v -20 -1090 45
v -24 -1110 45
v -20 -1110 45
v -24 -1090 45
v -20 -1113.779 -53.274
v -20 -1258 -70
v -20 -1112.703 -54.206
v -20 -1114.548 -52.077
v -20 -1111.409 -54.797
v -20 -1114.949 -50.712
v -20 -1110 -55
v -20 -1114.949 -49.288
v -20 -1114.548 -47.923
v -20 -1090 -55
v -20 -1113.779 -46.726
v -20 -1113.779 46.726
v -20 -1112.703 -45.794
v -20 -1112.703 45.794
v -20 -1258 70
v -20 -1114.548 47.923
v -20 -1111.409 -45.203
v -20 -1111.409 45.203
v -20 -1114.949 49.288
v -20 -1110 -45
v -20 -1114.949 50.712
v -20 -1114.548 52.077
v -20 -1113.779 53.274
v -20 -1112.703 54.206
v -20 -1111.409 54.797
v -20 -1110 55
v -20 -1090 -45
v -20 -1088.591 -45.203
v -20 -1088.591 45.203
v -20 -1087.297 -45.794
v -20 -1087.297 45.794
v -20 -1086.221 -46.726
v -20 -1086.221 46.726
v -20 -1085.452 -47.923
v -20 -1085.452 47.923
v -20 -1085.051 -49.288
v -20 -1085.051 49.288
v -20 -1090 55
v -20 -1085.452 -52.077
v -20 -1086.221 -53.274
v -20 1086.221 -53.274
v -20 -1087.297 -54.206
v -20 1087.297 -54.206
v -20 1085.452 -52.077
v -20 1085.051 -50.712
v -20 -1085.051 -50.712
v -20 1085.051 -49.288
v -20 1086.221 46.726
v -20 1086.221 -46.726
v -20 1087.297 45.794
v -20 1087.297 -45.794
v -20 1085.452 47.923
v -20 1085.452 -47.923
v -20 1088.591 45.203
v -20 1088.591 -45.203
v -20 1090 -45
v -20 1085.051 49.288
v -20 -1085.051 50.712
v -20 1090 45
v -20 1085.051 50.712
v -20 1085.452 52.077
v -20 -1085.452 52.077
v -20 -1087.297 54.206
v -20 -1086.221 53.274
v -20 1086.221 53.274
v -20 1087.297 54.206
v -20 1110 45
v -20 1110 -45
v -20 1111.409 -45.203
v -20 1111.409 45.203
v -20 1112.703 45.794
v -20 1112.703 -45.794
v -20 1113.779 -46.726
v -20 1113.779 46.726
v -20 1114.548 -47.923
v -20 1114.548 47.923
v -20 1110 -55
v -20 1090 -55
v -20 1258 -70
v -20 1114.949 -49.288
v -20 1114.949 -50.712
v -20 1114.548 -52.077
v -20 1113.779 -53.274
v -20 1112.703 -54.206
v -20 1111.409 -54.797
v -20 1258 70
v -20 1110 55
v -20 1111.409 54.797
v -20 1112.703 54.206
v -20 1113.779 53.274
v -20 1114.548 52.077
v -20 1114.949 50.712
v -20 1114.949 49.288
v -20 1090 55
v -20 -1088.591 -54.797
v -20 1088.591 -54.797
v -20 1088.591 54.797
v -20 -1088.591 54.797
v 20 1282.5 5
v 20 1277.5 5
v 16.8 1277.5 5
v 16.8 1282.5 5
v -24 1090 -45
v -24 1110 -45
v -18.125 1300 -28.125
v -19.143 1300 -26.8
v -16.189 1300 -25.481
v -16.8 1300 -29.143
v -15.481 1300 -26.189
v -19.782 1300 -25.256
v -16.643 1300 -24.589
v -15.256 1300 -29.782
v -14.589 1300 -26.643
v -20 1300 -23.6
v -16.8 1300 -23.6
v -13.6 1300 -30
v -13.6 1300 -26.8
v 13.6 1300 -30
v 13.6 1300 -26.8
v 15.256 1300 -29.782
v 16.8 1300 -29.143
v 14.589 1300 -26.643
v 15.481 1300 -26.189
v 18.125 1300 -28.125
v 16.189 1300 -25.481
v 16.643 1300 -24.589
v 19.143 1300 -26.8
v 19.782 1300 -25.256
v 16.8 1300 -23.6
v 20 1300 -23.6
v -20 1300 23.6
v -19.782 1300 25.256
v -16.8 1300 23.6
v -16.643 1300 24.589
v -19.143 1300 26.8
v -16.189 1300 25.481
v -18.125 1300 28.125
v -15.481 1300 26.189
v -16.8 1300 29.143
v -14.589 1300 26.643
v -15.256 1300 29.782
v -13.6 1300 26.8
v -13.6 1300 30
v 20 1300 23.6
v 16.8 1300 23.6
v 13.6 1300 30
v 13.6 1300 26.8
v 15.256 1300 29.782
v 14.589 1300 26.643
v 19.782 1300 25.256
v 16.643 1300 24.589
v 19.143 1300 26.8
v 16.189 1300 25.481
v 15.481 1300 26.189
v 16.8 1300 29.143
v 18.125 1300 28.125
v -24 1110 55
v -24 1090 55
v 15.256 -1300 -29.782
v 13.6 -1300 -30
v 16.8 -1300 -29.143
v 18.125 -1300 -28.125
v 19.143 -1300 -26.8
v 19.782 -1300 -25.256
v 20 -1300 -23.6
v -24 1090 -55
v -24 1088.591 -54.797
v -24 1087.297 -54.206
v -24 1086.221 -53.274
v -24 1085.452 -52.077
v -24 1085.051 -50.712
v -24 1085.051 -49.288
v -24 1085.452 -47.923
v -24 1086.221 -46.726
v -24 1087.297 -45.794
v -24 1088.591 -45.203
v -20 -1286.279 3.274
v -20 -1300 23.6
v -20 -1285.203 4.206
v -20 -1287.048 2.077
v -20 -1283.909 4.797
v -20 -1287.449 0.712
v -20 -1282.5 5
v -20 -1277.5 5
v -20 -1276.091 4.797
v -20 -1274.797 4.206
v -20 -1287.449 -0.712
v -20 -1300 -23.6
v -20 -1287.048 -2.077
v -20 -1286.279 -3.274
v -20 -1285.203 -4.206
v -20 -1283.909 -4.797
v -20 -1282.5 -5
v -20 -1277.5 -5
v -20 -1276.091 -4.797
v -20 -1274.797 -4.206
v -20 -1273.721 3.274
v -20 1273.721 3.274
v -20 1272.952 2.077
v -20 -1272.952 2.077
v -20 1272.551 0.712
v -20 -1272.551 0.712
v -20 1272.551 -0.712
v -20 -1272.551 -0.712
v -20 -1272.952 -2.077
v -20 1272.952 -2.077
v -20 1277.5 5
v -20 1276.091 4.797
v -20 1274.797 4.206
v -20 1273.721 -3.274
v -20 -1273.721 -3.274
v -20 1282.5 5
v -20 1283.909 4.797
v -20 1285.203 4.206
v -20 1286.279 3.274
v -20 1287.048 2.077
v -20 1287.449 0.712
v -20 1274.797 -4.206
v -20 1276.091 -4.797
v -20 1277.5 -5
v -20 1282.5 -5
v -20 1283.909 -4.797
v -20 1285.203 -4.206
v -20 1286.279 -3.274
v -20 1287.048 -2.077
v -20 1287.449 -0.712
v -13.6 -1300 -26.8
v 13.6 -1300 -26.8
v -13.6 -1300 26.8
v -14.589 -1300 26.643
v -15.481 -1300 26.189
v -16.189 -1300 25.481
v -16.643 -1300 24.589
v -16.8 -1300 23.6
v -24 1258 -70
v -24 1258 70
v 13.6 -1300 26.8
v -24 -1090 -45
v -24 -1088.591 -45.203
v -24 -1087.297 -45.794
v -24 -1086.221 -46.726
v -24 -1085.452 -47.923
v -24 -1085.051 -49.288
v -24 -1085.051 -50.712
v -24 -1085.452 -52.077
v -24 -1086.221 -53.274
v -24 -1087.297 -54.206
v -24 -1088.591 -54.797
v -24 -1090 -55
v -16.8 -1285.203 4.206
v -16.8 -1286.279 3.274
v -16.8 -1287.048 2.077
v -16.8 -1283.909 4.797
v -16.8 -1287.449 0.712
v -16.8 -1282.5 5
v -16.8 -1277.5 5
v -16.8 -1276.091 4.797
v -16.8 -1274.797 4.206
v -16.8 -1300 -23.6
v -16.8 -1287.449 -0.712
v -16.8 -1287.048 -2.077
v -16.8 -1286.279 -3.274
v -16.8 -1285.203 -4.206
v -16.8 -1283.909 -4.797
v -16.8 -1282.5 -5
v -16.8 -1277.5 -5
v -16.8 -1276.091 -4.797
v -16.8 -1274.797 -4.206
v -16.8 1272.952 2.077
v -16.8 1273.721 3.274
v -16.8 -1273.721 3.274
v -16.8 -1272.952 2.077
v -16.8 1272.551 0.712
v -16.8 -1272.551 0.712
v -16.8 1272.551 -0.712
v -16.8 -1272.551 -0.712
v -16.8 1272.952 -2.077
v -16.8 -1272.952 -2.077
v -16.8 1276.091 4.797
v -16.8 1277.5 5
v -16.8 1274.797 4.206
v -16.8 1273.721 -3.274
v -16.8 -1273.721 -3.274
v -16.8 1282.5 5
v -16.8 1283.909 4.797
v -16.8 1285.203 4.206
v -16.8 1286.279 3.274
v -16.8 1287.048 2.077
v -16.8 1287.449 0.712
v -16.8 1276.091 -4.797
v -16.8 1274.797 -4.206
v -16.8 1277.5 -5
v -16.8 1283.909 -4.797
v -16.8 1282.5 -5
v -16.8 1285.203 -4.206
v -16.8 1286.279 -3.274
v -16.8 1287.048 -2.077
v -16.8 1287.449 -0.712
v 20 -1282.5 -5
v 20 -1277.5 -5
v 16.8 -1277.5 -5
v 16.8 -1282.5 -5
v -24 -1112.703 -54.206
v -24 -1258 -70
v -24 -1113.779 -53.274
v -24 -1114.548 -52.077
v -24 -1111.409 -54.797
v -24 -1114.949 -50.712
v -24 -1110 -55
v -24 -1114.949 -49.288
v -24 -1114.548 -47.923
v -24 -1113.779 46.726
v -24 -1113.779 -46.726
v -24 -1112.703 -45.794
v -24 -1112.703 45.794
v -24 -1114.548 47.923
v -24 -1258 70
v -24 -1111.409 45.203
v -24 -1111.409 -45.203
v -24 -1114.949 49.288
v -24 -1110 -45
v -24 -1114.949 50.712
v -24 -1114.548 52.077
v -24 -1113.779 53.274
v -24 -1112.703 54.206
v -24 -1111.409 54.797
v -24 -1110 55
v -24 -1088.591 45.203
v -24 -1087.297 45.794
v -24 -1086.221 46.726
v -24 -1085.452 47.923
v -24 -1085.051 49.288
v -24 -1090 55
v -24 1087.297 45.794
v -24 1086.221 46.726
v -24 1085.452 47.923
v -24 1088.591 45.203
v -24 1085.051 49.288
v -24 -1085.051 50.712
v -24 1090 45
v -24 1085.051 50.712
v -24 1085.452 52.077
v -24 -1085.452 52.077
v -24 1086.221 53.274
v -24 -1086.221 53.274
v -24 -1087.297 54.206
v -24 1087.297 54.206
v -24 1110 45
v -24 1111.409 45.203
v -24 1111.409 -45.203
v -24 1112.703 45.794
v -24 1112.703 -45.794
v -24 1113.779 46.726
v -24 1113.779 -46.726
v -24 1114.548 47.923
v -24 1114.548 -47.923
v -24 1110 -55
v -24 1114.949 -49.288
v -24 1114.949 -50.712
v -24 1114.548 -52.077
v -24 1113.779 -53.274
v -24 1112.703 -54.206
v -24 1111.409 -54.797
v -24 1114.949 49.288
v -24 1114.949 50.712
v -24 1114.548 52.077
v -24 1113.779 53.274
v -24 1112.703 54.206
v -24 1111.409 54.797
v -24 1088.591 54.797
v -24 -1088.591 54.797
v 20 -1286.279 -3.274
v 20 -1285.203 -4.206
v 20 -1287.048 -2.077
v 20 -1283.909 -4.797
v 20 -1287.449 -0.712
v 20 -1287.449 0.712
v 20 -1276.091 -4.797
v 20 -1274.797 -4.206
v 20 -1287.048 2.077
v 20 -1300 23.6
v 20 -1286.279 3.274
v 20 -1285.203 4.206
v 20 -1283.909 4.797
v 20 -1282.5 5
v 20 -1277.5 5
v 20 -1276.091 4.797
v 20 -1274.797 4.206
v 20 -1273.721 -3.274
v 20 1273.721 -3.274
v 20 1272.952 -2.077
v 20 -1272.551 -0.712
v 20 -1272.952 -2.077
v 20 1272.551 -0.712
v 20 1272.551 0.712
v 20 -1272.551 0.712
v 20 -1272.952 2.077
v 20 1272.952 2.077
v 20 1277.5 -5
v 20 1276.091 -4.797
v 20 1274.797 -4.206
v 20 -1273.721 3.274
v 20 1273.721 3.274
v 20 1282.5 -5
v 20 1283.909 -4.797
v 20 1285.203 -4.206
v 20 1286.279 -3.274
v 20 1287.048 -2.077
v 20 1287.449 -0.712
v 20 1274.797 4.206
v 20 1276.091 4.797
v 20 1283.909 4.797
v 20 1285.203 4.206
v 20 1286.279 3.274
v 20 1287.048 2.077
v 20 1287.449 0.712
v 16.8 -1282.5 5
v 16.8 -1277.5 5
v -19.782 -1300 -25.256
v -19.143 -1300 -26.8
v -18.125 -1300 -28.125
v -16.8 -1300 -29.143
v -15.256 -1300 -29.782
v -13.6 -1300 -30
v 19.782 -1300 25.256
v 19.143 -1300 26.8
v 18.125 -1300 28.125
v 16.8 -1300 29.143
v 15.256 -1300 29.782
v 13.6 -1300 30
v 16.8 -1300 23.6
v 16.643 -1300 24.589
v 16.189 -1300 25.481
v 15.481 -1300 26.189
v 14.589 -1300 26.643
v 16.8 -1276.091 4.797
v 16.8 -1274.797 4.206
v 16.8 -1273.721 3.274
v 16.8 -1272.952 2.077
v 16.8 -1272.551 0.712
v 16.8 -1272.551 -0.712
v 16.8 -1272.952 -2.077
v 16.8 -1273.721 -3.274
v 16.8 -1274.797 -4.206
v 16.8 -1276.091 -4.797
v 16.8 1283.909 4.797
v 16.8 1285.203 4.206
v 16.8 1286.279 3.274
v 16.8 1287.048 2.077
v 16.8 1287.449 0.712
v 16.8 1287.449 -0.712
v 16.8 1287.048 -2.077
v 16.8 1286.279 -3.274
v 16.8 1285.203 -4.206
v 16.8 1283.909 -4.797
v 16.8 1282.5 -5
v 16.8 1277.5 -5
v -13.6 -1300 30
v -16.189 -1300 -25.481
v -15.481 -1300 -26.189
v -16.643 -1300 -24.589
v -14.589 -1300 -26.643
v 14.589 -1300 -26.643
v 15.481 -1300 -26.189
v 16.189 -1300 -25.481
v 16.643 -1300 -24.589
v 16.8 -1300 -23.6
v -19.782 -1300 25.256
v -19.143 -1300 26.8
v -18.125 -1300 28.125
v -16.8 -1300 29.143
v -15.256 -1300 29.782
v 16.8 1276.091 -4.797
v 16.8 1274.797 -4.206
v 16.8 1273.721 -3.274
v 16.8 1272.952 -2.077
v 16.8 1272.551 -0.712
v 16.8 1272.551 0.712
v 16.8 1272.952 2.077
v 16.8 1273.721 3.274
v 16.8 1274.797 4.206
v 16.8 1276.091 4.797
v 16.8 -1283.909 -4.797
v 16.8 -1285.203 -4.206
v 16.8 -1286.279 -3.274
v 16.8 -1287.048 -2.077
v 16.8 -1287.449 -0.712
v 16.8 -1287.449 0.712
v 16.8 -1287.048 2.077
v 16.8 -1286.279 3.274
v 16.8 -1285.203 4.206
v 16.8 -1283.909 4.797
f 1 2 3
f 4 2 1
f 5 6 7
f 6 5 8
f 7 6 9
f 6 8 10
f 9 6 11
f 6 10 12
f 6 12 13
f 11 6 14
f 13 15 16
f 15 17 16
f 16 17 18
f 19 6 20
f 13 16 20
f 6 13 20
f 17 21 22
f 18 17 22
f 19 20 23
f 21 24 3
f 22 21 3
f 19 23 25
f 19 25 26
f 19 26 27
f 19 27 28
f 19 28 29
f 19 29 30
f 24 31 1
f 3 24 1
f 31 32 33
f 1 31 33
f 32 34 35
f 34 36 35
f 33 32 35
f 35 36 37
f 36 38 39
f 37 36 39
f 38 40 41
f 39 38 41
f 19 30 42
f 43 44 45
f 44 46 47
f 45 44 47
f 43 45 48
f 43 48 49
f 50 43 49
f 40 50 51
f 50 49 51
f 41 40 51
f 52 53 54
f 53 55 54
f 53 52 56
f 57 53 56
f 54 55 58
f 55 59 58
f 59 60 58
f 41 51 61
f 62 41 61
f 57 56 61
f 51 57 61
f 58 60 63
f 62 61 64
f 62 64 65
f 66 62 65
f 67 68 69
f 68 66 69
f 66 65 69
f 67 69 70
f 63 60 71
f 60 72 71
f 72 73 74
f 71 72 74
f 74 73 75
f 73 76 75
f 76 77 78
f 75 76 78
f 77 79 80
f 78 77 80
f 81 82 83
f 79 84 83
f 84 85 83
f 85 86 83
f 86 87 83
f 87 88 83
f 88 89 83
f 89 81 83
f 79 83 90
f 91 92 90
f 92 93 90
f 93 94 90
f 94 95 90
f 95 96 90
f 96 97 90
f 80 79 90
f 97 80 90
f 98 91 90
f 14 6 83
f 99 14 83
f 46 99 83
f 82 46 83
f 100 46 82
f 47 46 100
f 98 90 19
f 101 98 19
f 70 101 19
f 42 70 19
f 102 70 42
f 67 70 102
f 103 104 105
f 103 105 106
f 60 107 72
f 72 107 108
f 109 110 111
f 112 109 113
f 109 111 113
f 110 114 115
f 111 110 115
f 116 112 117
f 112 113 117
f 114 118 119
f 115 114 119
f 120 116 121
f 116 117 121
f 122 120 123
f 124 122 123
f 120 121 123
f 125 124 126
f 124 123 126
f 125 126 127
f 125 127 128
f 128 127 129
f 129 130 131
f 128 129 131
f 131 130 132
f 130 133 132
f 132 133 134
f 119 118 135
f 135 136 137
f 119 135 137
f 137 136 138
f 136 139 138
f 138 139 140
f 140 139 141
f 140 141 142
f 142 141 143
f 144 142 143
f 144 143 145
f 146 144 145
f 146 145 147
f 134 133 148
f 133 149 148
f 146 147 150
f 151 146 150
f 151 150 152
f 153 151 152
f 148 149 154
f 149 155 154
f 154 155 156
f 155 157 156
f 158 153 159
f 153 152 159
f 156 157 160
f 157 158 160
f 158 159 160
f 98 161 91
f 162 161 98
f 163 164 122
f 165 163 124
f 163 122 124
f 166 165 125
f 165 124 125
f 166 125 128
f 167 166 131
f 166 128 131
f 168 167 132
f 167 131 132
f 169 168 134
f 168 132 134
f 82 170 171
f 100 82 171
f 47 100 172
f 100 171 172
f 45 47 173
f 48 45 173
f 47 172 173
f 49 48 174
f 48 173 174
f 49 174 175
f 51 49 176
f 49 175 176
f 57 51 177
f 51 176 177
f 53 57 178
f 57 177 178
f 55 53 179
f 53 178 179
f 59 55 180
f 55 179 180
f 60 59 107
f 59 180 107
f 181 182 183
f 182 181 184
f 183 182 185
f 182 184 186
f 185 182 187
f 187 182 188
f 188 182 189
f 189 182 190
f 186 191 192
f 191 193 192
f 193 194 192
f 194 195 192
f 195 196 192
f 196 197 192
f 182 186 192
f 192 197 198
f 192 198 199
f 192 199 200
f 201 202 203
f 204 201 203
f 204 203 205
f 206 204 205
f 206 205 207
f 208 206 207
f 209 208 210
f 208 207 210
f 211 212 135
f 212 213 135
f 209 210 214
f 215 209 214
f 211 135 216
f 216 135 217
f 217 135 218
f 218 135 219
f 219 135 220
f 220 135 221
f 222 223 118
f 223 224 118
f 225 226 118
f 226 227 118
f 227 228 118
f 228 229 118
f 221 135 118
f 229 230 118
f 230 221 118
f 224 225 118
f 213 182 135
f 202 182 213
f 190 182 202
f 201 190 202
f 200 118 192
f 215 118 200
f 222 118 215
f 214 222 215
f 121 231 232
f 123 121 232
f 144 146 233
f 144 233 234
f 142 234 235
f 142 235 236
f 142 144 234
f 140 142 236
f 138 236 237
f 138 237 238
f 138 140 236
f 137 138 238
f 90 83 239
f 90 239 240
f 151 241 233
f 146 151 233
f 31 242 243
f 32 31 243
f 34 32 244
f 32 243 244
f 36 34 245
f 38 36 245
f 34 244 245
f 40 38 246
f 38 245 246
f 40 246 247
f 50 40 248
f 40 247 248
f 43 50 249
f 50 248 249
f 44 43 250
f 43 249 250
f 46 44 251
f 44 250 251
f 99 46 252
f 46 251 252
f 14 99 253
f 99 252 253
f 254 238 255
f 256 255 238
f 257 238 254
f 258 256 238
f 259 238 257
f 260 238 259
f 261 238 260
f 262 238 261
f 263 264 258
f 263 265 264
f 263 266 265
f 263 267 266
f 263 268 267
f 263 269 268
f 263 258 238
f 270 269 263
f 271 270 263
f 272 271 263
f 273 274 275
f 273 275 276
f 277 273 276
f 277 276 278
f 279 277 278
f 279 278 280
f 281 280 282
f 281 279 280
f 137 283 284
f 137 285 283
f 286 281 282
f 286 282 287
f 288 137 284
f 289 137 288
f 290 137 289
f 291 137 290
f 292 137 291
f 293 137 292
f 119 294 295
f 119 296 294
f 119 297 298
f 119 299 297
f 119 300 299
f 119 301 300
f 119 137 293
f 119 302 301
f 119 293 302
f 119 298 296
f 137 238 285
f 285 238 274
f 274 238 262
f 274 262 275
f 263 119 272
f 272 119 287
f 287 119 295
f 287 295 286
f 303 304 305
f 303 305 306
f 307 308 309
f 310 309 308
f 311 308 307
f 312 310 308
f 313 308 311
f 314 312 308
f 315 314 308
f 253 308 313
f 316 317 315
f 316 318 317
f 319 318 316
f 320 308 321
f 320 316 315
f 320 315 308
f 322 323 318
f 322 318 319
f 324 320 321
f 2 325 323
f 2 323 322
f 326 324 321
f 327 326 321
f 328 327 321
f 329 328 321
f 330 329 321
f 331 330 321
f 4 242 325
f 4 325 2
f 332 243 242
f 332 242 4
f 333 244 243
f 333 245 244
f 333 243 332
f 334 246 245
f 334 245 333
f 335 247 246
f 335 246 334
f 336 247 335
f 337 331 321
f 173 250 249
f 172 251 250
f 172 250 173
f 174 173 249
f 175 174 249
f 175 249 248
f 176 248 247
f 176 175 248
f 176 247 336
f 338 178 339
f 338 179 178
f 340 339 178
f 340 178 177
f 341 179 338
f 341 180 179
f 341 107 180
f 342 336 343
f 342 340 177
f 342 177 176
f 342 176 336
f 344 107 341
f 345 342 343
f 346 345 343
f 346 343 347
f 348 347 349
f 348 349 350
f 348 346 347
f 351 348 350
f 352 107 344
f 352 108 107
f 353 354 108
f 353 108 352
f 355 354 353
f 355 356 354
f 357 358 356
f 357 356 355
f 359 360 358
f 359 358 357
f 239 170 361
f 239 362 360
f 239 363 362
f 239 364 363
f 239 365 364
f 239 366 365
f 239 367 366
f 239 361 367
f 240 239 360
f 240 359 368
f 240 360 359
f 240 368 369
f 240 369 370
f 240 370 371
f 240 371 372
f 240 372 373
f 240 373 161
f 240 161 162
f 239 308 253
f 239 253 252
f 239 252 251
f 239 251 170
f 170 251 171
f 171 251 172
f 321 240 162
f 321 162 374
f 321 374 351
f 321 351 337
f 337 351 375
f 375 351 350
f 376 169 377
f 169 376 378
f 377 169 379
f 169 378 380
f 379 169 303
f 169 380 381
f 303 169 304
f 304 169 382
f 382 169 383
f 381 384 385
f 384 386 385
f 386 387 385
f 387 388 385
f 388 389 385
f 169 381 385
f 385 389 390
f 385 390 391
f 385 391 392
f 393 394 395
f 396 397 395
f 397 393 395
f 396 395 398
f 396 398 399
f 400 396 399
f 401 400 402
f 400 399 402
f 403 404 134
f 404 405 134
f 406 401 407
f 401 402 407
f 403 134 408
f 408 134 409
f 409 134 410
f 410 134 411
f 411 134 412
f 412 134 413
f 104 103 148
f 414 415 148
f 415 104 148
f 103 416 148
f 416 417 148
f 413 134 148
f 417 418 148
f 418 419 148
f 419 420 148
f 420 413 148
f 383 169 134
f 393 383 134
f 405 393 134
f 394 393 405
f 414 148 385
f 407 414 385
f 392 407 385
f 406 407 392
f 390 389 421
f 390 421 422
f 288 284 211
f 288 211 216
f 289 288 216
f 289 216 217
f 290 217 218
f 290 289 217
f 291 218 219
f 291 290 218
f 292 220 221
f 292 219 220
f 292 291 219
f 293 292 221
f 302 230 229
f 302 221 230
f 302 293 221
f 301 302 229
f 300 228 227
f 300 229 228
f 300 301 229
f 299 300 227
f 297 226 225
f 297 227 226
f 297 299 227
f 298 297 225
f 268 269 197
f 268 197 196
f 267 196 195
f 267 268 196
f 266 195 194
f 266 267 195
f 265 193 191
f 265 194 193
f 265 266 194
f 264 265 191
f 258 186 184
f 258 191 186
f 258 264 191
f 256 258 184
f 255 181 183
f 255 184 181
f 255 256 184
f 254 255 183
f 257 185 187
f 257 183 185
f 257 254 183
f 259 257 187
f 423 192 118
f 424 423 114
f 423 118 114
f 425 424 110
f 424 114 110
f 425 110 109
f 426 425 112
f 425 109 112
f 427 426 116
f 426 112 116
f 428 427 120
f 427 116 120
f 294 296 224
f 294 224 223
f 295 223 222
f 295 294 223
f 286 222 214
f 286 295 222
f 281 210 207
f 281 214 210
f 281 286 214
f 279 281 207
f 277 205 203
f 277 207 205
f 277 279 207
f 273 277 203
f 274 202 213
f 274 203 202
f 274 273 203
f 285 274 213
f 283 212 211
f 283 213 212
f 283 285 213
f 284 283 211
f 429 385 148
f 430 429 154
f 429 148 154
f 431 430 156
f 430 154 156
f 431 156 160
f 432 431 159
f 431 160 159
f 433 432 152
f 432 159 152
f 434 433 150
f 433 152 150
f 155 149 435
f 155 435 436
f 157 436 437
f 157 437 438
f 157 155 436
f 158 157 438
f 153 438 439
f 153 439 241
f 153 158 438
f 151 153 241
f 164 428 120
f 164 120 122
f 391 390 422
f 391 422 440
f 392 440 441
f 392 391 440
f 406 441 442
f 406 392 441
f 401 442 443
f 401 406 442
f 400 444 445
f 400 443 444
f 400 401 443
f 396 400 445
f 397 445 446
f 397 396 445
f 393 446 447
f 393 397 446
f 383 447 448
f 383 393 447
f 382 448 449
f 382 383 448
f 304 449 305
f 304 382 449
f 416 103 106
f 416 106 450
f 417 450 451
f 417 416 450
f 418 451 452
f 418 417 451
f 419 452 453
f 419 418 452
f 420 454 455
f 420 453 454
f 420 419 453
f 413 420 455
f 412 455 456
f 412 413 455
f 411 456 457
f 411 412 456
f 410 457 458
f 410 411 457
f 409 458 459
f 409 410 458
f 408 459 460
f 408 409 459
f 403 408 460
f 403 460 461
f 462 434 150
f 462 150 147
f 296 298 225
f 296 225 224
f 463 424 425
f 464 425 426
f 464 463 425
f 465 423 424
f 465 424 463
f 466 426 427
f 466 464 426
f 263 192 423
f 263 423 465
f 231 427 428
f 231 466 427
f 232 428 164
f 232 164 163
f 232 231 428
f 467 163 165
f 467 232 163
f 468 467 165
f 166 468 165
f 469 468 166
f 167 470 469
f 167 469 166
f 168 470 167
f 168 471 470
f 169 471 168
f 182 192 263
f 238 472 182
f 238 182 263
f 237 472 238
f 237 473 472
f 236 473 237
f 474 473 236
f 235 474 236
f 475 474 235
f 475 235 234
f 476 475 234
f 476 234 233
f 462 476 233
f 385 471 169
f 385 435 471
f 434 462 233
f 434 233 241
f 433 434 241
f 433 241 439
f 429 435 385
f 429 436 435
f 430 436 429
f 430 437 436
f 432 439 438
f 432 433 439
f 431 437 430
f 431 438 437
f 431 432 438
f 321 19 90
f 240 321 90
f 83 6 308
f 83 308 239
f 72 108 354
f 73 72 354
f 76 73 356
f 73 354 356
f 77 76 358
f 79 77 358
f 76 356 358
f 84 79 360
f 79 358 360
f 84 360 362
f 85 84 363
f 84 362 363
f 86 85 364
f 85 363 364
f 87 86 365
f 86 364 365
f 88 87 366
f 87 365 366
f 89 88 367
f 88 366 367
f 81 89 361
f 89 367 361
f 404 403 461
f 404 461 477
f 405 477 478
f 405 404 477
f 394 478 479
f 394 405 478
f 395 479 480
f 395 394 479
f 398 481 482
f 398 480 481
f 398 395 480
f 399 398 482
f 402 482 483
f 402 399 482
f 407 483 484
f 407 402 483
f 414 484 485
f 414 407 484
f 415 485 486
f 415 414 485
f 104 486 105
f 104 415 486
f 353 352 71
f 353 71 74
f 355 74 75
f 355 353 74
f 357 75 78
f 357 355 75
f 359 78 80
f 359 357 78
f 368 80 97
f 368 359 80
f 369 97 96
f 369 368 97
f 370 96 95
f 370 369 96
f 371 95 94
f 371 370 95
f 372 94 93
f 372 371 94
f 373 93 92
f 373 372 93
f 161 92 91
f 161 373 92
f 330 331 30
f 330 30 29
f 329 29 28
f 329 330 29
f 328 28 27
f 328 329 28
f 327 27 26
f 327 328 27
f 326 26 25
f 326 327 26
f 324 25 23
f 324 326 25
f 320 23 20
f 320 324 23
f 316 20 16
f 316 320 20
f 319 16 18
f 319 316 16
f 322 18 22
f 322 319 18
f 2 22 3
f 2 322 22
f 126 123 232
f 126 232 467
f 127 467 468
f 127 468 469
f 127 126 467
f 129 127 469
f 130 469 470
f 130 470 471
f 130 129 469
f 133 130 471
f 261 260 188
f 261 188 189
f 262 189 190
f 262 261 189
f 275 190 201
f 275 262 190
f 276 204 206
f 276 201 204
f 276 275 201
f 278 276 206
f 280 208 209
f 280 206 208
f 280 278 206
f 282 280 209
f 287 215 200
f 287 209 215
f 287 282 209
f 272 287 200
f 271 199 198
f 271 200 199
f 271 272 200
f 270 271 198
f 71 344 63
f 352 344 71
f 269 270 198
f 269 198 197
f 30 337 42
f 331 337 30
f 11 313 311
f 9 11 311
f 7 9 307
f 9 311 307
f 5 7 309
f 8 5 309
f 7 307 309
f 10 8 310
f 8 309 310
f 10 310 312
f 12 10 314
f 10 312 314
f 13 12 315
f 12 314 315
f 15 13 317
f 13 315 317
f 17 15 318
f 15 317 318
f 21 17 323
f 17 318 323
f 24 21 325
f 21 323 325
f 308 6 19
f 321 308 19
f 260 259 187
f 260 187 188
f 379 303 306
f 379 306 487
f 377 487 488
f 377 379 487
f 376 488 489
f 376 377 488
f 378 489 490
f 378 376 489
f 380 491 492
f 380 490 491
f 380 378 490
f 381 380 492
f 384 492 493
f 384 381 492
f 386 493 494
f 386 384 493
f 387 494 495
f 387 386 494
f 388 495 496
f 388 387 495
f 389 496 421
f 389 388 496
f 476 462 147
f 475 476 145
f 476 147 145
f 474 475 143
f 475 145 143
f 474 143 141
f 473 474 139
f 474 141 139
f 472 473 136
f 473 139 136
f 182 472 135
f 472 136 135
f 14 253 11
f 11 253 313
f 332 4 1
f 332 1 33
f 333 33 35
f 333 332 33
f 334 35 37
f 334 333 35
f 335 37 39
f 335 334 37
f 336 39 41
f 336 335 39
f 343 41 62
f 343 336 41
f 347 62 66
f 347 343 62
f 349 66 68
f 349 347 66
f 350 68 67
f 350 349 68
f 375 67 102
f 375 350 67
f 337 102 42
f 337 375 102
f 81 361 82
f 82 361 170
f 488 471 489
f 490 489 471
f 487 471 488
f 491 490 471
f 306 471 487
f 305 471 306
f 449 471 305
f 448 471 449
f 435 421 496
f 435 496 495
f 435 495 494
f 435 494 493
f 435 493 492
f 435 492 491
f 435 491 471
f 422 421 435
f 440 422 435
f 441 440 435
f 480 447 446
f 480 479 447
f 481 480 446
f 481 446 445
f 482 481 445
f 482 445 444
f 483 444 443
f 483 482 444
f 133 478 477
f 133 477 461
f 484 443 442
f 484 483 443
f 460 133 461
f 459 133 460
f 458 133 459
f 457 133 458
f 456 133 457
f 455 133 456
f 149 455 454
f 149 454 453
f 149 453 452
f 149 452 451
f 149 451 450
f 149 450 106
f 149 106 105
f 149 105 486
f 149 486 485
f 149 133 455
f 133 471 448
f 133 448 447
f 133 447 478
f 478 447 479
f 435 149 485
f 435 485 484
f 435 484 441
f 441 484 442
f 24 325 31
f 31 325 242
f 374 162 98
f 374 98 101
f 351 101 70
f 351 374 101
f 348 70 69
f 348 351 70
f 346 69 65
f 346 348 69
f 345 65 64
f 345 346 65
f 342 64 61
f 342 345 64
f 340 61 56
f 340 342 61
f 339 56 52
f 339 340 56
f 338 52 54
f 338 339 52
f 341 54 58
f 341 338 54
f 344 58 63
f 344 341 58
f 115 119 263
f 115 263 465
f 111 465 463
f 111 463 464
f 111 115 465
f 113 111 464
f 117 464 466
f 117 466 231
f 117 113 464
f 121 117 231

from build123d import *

# Parameters (mm, degrees)
MEMBER_1_DEPTH         = 2600
SKETCH_3_W             = 140
SKETCH_3_H             = 2516
SM_BASE_FLANGE_1_DEPTH = 4
CUT_EXTRUDE_1_DEPTH    = 1303.626577343
CUT_EXTRUDE_5_DEPTH    = 499


# Sheet-metal steps are written as plain solids
with BuildPart() as part:
    # Sketch1 → Member 1 (new body)
    with BuildSketch(Plane.XZ.offset(-1300)):
        with BuildLine():
            Line((-13.6, -30), (13.6, -30))
            ThreePointArc((13.6, -30), (18.1254834, -28.1254834), (20, -23.6))
            Line((20, -23.6), (20, 23.6))
            ThreePointArc((20, 23.6), (18.1254834, 28.1254834), (13.6, 30))
            Line((13.6, 30), (-13.6, 30))
            ThreePointArc((-13.6, 30), (-18.1254834, 28.1254834), (-20, 23.6))
            Line((-20, 23.6), (-20, -23.6))
            ThreePointArc((-20, -23.6), (-18.1254834, -28.1254834), (-13.6, -30))
        make_face()
        with BuildLine():
            Line((-13.6, -26.8), (13.6, -26.8))
            ThreePointArc((13.6, -26.8), (15.8627417, -25.8627417), (16.8, -23.6))
            Line((16.8, -23.6), (16.8, 23.6))
            ThreePointArc((16.8, 23.6), (15.8627417, 25.8627417), (13.6, 26.8))
            Line((13.6, 26.8), (-13.6, 26.8))
            ThreePointArc((-13.6, 26.8), (-15.8627417, 25.8627417), (-16.8, 23.6))
            Line((-16.8, 23.6), (-16.8, -23.6))
            ThreePointArc((-16.8, -23.6), (-15.8627417, -25.8627417), (-13.6, -26.8))
        make_face(mode=Mode.SUBTRACT)
    extrude(amount=MEMBER_1_DEPTH)

    # 草图4 → 切除-拉伸1 (cut, through all)
    with BuildSketch(Plane(origin=(20, 0, 0), x_dir=(0, 0, -1), z_dir=(1, 0, 0))):
        with BuildLine():
            Line((-5, -1282.5), (-5, -1277.5))
            ThreePointArc((-5, -1277.5), (0, -1272.5), (5, -1277.5))
            Line((5, -1277.5), (5, -1282.5))
            ThreePointArc((5, -1282.5), (0, -1287.5), (-5, -1282.5))
        make_face()
        with BuildLine():
            Line((-5, 1277.5), (-5, 1282.5))
            ThreePointArc((-5, 1282.5), (0, 1287.5), (5, 1282.5))
            Line((5, 1282.5), (5, 1277.5))
            ThreePointArc((5, 1277.5), (0, 1272.5), (-5, 1277.5))
        make_face()
    extrude(amount=-CUT_EXTRUDE_1_DEPTH, mode=Mode.SUBTRACT)


with BuildPart() as body_2:
    # 草图3 → 基体-法兰1 (new body)
    with BuildSketch(Plane.ZY.offset(20)):
        Rectangle(SKETCH_3_W, SKETCH_3_H)
    extrude(amount=SM_BASE_FLANGE_1_DEPTH)

    # 草图8 → 切除-拉伸5 (cut)
    with BuildSketch(Plane.ZY.offset(24)):
        with BuildLine():
            Line((55, 1110.000000001), (55, 1090.000000001))
            ThreePointArc((55, 1090.000000001), (50, 1085.000000001), (45, 1090.000000001))
            Line((45, 1090.000000001), (45, 1110.000000001))
            ThreePointArc((45, 1110.000000001), (50, 1115.000000001), (55, 1110.000000001))
        make_face()
        with BuildLine():
            Line((55, -1089.999999999), (55, -1109.999999999))
            ThreePointArc((55, -1109.999999999), (50, -1114.999999999), (45, -1109.999999999))
            Line((45, -1109.999999999), (45, -1089.999999999))
            ThreePointArc((45, -1089.999999999), (50, -1084.999999999), (55, -1089.999999999))
        make_face()
        with BuildLine():
            Line((-55, -1089.999999999), (-55, -1109.999999999))
            ThreePointArc((-55, -1109.999999999), (-50, -1114.999999999), (-45, -1109.999999999))
            Line((-45, -1109.999999999), (-45, -1089.999999999))
            ThreePointArc((-45, -1089.999999999), (-50, -1084.999999999), (-55, -1089.999999999))
        make_face()
        with BuildLine():
            Line((-55, 1110.000000001), (-55, 1090.000000001))
            ThreePointArc((-55, 1090.000000001), (-50, 1085.000000001), (-45, 1090.000000001))
            Line((-45, 1090.000000001), (-45, 1110.000000001))
            ThreePointArc((-45, 1110.000000001), (-50, 1115.000000001), (-55, 1110.000000001))
        make_face()
    extrude(amount=-CUT_EXTRUDE_5_DEPTH, mode=Mode.SUBTRACT)


solid = Compound([part.part, body_2.part])
